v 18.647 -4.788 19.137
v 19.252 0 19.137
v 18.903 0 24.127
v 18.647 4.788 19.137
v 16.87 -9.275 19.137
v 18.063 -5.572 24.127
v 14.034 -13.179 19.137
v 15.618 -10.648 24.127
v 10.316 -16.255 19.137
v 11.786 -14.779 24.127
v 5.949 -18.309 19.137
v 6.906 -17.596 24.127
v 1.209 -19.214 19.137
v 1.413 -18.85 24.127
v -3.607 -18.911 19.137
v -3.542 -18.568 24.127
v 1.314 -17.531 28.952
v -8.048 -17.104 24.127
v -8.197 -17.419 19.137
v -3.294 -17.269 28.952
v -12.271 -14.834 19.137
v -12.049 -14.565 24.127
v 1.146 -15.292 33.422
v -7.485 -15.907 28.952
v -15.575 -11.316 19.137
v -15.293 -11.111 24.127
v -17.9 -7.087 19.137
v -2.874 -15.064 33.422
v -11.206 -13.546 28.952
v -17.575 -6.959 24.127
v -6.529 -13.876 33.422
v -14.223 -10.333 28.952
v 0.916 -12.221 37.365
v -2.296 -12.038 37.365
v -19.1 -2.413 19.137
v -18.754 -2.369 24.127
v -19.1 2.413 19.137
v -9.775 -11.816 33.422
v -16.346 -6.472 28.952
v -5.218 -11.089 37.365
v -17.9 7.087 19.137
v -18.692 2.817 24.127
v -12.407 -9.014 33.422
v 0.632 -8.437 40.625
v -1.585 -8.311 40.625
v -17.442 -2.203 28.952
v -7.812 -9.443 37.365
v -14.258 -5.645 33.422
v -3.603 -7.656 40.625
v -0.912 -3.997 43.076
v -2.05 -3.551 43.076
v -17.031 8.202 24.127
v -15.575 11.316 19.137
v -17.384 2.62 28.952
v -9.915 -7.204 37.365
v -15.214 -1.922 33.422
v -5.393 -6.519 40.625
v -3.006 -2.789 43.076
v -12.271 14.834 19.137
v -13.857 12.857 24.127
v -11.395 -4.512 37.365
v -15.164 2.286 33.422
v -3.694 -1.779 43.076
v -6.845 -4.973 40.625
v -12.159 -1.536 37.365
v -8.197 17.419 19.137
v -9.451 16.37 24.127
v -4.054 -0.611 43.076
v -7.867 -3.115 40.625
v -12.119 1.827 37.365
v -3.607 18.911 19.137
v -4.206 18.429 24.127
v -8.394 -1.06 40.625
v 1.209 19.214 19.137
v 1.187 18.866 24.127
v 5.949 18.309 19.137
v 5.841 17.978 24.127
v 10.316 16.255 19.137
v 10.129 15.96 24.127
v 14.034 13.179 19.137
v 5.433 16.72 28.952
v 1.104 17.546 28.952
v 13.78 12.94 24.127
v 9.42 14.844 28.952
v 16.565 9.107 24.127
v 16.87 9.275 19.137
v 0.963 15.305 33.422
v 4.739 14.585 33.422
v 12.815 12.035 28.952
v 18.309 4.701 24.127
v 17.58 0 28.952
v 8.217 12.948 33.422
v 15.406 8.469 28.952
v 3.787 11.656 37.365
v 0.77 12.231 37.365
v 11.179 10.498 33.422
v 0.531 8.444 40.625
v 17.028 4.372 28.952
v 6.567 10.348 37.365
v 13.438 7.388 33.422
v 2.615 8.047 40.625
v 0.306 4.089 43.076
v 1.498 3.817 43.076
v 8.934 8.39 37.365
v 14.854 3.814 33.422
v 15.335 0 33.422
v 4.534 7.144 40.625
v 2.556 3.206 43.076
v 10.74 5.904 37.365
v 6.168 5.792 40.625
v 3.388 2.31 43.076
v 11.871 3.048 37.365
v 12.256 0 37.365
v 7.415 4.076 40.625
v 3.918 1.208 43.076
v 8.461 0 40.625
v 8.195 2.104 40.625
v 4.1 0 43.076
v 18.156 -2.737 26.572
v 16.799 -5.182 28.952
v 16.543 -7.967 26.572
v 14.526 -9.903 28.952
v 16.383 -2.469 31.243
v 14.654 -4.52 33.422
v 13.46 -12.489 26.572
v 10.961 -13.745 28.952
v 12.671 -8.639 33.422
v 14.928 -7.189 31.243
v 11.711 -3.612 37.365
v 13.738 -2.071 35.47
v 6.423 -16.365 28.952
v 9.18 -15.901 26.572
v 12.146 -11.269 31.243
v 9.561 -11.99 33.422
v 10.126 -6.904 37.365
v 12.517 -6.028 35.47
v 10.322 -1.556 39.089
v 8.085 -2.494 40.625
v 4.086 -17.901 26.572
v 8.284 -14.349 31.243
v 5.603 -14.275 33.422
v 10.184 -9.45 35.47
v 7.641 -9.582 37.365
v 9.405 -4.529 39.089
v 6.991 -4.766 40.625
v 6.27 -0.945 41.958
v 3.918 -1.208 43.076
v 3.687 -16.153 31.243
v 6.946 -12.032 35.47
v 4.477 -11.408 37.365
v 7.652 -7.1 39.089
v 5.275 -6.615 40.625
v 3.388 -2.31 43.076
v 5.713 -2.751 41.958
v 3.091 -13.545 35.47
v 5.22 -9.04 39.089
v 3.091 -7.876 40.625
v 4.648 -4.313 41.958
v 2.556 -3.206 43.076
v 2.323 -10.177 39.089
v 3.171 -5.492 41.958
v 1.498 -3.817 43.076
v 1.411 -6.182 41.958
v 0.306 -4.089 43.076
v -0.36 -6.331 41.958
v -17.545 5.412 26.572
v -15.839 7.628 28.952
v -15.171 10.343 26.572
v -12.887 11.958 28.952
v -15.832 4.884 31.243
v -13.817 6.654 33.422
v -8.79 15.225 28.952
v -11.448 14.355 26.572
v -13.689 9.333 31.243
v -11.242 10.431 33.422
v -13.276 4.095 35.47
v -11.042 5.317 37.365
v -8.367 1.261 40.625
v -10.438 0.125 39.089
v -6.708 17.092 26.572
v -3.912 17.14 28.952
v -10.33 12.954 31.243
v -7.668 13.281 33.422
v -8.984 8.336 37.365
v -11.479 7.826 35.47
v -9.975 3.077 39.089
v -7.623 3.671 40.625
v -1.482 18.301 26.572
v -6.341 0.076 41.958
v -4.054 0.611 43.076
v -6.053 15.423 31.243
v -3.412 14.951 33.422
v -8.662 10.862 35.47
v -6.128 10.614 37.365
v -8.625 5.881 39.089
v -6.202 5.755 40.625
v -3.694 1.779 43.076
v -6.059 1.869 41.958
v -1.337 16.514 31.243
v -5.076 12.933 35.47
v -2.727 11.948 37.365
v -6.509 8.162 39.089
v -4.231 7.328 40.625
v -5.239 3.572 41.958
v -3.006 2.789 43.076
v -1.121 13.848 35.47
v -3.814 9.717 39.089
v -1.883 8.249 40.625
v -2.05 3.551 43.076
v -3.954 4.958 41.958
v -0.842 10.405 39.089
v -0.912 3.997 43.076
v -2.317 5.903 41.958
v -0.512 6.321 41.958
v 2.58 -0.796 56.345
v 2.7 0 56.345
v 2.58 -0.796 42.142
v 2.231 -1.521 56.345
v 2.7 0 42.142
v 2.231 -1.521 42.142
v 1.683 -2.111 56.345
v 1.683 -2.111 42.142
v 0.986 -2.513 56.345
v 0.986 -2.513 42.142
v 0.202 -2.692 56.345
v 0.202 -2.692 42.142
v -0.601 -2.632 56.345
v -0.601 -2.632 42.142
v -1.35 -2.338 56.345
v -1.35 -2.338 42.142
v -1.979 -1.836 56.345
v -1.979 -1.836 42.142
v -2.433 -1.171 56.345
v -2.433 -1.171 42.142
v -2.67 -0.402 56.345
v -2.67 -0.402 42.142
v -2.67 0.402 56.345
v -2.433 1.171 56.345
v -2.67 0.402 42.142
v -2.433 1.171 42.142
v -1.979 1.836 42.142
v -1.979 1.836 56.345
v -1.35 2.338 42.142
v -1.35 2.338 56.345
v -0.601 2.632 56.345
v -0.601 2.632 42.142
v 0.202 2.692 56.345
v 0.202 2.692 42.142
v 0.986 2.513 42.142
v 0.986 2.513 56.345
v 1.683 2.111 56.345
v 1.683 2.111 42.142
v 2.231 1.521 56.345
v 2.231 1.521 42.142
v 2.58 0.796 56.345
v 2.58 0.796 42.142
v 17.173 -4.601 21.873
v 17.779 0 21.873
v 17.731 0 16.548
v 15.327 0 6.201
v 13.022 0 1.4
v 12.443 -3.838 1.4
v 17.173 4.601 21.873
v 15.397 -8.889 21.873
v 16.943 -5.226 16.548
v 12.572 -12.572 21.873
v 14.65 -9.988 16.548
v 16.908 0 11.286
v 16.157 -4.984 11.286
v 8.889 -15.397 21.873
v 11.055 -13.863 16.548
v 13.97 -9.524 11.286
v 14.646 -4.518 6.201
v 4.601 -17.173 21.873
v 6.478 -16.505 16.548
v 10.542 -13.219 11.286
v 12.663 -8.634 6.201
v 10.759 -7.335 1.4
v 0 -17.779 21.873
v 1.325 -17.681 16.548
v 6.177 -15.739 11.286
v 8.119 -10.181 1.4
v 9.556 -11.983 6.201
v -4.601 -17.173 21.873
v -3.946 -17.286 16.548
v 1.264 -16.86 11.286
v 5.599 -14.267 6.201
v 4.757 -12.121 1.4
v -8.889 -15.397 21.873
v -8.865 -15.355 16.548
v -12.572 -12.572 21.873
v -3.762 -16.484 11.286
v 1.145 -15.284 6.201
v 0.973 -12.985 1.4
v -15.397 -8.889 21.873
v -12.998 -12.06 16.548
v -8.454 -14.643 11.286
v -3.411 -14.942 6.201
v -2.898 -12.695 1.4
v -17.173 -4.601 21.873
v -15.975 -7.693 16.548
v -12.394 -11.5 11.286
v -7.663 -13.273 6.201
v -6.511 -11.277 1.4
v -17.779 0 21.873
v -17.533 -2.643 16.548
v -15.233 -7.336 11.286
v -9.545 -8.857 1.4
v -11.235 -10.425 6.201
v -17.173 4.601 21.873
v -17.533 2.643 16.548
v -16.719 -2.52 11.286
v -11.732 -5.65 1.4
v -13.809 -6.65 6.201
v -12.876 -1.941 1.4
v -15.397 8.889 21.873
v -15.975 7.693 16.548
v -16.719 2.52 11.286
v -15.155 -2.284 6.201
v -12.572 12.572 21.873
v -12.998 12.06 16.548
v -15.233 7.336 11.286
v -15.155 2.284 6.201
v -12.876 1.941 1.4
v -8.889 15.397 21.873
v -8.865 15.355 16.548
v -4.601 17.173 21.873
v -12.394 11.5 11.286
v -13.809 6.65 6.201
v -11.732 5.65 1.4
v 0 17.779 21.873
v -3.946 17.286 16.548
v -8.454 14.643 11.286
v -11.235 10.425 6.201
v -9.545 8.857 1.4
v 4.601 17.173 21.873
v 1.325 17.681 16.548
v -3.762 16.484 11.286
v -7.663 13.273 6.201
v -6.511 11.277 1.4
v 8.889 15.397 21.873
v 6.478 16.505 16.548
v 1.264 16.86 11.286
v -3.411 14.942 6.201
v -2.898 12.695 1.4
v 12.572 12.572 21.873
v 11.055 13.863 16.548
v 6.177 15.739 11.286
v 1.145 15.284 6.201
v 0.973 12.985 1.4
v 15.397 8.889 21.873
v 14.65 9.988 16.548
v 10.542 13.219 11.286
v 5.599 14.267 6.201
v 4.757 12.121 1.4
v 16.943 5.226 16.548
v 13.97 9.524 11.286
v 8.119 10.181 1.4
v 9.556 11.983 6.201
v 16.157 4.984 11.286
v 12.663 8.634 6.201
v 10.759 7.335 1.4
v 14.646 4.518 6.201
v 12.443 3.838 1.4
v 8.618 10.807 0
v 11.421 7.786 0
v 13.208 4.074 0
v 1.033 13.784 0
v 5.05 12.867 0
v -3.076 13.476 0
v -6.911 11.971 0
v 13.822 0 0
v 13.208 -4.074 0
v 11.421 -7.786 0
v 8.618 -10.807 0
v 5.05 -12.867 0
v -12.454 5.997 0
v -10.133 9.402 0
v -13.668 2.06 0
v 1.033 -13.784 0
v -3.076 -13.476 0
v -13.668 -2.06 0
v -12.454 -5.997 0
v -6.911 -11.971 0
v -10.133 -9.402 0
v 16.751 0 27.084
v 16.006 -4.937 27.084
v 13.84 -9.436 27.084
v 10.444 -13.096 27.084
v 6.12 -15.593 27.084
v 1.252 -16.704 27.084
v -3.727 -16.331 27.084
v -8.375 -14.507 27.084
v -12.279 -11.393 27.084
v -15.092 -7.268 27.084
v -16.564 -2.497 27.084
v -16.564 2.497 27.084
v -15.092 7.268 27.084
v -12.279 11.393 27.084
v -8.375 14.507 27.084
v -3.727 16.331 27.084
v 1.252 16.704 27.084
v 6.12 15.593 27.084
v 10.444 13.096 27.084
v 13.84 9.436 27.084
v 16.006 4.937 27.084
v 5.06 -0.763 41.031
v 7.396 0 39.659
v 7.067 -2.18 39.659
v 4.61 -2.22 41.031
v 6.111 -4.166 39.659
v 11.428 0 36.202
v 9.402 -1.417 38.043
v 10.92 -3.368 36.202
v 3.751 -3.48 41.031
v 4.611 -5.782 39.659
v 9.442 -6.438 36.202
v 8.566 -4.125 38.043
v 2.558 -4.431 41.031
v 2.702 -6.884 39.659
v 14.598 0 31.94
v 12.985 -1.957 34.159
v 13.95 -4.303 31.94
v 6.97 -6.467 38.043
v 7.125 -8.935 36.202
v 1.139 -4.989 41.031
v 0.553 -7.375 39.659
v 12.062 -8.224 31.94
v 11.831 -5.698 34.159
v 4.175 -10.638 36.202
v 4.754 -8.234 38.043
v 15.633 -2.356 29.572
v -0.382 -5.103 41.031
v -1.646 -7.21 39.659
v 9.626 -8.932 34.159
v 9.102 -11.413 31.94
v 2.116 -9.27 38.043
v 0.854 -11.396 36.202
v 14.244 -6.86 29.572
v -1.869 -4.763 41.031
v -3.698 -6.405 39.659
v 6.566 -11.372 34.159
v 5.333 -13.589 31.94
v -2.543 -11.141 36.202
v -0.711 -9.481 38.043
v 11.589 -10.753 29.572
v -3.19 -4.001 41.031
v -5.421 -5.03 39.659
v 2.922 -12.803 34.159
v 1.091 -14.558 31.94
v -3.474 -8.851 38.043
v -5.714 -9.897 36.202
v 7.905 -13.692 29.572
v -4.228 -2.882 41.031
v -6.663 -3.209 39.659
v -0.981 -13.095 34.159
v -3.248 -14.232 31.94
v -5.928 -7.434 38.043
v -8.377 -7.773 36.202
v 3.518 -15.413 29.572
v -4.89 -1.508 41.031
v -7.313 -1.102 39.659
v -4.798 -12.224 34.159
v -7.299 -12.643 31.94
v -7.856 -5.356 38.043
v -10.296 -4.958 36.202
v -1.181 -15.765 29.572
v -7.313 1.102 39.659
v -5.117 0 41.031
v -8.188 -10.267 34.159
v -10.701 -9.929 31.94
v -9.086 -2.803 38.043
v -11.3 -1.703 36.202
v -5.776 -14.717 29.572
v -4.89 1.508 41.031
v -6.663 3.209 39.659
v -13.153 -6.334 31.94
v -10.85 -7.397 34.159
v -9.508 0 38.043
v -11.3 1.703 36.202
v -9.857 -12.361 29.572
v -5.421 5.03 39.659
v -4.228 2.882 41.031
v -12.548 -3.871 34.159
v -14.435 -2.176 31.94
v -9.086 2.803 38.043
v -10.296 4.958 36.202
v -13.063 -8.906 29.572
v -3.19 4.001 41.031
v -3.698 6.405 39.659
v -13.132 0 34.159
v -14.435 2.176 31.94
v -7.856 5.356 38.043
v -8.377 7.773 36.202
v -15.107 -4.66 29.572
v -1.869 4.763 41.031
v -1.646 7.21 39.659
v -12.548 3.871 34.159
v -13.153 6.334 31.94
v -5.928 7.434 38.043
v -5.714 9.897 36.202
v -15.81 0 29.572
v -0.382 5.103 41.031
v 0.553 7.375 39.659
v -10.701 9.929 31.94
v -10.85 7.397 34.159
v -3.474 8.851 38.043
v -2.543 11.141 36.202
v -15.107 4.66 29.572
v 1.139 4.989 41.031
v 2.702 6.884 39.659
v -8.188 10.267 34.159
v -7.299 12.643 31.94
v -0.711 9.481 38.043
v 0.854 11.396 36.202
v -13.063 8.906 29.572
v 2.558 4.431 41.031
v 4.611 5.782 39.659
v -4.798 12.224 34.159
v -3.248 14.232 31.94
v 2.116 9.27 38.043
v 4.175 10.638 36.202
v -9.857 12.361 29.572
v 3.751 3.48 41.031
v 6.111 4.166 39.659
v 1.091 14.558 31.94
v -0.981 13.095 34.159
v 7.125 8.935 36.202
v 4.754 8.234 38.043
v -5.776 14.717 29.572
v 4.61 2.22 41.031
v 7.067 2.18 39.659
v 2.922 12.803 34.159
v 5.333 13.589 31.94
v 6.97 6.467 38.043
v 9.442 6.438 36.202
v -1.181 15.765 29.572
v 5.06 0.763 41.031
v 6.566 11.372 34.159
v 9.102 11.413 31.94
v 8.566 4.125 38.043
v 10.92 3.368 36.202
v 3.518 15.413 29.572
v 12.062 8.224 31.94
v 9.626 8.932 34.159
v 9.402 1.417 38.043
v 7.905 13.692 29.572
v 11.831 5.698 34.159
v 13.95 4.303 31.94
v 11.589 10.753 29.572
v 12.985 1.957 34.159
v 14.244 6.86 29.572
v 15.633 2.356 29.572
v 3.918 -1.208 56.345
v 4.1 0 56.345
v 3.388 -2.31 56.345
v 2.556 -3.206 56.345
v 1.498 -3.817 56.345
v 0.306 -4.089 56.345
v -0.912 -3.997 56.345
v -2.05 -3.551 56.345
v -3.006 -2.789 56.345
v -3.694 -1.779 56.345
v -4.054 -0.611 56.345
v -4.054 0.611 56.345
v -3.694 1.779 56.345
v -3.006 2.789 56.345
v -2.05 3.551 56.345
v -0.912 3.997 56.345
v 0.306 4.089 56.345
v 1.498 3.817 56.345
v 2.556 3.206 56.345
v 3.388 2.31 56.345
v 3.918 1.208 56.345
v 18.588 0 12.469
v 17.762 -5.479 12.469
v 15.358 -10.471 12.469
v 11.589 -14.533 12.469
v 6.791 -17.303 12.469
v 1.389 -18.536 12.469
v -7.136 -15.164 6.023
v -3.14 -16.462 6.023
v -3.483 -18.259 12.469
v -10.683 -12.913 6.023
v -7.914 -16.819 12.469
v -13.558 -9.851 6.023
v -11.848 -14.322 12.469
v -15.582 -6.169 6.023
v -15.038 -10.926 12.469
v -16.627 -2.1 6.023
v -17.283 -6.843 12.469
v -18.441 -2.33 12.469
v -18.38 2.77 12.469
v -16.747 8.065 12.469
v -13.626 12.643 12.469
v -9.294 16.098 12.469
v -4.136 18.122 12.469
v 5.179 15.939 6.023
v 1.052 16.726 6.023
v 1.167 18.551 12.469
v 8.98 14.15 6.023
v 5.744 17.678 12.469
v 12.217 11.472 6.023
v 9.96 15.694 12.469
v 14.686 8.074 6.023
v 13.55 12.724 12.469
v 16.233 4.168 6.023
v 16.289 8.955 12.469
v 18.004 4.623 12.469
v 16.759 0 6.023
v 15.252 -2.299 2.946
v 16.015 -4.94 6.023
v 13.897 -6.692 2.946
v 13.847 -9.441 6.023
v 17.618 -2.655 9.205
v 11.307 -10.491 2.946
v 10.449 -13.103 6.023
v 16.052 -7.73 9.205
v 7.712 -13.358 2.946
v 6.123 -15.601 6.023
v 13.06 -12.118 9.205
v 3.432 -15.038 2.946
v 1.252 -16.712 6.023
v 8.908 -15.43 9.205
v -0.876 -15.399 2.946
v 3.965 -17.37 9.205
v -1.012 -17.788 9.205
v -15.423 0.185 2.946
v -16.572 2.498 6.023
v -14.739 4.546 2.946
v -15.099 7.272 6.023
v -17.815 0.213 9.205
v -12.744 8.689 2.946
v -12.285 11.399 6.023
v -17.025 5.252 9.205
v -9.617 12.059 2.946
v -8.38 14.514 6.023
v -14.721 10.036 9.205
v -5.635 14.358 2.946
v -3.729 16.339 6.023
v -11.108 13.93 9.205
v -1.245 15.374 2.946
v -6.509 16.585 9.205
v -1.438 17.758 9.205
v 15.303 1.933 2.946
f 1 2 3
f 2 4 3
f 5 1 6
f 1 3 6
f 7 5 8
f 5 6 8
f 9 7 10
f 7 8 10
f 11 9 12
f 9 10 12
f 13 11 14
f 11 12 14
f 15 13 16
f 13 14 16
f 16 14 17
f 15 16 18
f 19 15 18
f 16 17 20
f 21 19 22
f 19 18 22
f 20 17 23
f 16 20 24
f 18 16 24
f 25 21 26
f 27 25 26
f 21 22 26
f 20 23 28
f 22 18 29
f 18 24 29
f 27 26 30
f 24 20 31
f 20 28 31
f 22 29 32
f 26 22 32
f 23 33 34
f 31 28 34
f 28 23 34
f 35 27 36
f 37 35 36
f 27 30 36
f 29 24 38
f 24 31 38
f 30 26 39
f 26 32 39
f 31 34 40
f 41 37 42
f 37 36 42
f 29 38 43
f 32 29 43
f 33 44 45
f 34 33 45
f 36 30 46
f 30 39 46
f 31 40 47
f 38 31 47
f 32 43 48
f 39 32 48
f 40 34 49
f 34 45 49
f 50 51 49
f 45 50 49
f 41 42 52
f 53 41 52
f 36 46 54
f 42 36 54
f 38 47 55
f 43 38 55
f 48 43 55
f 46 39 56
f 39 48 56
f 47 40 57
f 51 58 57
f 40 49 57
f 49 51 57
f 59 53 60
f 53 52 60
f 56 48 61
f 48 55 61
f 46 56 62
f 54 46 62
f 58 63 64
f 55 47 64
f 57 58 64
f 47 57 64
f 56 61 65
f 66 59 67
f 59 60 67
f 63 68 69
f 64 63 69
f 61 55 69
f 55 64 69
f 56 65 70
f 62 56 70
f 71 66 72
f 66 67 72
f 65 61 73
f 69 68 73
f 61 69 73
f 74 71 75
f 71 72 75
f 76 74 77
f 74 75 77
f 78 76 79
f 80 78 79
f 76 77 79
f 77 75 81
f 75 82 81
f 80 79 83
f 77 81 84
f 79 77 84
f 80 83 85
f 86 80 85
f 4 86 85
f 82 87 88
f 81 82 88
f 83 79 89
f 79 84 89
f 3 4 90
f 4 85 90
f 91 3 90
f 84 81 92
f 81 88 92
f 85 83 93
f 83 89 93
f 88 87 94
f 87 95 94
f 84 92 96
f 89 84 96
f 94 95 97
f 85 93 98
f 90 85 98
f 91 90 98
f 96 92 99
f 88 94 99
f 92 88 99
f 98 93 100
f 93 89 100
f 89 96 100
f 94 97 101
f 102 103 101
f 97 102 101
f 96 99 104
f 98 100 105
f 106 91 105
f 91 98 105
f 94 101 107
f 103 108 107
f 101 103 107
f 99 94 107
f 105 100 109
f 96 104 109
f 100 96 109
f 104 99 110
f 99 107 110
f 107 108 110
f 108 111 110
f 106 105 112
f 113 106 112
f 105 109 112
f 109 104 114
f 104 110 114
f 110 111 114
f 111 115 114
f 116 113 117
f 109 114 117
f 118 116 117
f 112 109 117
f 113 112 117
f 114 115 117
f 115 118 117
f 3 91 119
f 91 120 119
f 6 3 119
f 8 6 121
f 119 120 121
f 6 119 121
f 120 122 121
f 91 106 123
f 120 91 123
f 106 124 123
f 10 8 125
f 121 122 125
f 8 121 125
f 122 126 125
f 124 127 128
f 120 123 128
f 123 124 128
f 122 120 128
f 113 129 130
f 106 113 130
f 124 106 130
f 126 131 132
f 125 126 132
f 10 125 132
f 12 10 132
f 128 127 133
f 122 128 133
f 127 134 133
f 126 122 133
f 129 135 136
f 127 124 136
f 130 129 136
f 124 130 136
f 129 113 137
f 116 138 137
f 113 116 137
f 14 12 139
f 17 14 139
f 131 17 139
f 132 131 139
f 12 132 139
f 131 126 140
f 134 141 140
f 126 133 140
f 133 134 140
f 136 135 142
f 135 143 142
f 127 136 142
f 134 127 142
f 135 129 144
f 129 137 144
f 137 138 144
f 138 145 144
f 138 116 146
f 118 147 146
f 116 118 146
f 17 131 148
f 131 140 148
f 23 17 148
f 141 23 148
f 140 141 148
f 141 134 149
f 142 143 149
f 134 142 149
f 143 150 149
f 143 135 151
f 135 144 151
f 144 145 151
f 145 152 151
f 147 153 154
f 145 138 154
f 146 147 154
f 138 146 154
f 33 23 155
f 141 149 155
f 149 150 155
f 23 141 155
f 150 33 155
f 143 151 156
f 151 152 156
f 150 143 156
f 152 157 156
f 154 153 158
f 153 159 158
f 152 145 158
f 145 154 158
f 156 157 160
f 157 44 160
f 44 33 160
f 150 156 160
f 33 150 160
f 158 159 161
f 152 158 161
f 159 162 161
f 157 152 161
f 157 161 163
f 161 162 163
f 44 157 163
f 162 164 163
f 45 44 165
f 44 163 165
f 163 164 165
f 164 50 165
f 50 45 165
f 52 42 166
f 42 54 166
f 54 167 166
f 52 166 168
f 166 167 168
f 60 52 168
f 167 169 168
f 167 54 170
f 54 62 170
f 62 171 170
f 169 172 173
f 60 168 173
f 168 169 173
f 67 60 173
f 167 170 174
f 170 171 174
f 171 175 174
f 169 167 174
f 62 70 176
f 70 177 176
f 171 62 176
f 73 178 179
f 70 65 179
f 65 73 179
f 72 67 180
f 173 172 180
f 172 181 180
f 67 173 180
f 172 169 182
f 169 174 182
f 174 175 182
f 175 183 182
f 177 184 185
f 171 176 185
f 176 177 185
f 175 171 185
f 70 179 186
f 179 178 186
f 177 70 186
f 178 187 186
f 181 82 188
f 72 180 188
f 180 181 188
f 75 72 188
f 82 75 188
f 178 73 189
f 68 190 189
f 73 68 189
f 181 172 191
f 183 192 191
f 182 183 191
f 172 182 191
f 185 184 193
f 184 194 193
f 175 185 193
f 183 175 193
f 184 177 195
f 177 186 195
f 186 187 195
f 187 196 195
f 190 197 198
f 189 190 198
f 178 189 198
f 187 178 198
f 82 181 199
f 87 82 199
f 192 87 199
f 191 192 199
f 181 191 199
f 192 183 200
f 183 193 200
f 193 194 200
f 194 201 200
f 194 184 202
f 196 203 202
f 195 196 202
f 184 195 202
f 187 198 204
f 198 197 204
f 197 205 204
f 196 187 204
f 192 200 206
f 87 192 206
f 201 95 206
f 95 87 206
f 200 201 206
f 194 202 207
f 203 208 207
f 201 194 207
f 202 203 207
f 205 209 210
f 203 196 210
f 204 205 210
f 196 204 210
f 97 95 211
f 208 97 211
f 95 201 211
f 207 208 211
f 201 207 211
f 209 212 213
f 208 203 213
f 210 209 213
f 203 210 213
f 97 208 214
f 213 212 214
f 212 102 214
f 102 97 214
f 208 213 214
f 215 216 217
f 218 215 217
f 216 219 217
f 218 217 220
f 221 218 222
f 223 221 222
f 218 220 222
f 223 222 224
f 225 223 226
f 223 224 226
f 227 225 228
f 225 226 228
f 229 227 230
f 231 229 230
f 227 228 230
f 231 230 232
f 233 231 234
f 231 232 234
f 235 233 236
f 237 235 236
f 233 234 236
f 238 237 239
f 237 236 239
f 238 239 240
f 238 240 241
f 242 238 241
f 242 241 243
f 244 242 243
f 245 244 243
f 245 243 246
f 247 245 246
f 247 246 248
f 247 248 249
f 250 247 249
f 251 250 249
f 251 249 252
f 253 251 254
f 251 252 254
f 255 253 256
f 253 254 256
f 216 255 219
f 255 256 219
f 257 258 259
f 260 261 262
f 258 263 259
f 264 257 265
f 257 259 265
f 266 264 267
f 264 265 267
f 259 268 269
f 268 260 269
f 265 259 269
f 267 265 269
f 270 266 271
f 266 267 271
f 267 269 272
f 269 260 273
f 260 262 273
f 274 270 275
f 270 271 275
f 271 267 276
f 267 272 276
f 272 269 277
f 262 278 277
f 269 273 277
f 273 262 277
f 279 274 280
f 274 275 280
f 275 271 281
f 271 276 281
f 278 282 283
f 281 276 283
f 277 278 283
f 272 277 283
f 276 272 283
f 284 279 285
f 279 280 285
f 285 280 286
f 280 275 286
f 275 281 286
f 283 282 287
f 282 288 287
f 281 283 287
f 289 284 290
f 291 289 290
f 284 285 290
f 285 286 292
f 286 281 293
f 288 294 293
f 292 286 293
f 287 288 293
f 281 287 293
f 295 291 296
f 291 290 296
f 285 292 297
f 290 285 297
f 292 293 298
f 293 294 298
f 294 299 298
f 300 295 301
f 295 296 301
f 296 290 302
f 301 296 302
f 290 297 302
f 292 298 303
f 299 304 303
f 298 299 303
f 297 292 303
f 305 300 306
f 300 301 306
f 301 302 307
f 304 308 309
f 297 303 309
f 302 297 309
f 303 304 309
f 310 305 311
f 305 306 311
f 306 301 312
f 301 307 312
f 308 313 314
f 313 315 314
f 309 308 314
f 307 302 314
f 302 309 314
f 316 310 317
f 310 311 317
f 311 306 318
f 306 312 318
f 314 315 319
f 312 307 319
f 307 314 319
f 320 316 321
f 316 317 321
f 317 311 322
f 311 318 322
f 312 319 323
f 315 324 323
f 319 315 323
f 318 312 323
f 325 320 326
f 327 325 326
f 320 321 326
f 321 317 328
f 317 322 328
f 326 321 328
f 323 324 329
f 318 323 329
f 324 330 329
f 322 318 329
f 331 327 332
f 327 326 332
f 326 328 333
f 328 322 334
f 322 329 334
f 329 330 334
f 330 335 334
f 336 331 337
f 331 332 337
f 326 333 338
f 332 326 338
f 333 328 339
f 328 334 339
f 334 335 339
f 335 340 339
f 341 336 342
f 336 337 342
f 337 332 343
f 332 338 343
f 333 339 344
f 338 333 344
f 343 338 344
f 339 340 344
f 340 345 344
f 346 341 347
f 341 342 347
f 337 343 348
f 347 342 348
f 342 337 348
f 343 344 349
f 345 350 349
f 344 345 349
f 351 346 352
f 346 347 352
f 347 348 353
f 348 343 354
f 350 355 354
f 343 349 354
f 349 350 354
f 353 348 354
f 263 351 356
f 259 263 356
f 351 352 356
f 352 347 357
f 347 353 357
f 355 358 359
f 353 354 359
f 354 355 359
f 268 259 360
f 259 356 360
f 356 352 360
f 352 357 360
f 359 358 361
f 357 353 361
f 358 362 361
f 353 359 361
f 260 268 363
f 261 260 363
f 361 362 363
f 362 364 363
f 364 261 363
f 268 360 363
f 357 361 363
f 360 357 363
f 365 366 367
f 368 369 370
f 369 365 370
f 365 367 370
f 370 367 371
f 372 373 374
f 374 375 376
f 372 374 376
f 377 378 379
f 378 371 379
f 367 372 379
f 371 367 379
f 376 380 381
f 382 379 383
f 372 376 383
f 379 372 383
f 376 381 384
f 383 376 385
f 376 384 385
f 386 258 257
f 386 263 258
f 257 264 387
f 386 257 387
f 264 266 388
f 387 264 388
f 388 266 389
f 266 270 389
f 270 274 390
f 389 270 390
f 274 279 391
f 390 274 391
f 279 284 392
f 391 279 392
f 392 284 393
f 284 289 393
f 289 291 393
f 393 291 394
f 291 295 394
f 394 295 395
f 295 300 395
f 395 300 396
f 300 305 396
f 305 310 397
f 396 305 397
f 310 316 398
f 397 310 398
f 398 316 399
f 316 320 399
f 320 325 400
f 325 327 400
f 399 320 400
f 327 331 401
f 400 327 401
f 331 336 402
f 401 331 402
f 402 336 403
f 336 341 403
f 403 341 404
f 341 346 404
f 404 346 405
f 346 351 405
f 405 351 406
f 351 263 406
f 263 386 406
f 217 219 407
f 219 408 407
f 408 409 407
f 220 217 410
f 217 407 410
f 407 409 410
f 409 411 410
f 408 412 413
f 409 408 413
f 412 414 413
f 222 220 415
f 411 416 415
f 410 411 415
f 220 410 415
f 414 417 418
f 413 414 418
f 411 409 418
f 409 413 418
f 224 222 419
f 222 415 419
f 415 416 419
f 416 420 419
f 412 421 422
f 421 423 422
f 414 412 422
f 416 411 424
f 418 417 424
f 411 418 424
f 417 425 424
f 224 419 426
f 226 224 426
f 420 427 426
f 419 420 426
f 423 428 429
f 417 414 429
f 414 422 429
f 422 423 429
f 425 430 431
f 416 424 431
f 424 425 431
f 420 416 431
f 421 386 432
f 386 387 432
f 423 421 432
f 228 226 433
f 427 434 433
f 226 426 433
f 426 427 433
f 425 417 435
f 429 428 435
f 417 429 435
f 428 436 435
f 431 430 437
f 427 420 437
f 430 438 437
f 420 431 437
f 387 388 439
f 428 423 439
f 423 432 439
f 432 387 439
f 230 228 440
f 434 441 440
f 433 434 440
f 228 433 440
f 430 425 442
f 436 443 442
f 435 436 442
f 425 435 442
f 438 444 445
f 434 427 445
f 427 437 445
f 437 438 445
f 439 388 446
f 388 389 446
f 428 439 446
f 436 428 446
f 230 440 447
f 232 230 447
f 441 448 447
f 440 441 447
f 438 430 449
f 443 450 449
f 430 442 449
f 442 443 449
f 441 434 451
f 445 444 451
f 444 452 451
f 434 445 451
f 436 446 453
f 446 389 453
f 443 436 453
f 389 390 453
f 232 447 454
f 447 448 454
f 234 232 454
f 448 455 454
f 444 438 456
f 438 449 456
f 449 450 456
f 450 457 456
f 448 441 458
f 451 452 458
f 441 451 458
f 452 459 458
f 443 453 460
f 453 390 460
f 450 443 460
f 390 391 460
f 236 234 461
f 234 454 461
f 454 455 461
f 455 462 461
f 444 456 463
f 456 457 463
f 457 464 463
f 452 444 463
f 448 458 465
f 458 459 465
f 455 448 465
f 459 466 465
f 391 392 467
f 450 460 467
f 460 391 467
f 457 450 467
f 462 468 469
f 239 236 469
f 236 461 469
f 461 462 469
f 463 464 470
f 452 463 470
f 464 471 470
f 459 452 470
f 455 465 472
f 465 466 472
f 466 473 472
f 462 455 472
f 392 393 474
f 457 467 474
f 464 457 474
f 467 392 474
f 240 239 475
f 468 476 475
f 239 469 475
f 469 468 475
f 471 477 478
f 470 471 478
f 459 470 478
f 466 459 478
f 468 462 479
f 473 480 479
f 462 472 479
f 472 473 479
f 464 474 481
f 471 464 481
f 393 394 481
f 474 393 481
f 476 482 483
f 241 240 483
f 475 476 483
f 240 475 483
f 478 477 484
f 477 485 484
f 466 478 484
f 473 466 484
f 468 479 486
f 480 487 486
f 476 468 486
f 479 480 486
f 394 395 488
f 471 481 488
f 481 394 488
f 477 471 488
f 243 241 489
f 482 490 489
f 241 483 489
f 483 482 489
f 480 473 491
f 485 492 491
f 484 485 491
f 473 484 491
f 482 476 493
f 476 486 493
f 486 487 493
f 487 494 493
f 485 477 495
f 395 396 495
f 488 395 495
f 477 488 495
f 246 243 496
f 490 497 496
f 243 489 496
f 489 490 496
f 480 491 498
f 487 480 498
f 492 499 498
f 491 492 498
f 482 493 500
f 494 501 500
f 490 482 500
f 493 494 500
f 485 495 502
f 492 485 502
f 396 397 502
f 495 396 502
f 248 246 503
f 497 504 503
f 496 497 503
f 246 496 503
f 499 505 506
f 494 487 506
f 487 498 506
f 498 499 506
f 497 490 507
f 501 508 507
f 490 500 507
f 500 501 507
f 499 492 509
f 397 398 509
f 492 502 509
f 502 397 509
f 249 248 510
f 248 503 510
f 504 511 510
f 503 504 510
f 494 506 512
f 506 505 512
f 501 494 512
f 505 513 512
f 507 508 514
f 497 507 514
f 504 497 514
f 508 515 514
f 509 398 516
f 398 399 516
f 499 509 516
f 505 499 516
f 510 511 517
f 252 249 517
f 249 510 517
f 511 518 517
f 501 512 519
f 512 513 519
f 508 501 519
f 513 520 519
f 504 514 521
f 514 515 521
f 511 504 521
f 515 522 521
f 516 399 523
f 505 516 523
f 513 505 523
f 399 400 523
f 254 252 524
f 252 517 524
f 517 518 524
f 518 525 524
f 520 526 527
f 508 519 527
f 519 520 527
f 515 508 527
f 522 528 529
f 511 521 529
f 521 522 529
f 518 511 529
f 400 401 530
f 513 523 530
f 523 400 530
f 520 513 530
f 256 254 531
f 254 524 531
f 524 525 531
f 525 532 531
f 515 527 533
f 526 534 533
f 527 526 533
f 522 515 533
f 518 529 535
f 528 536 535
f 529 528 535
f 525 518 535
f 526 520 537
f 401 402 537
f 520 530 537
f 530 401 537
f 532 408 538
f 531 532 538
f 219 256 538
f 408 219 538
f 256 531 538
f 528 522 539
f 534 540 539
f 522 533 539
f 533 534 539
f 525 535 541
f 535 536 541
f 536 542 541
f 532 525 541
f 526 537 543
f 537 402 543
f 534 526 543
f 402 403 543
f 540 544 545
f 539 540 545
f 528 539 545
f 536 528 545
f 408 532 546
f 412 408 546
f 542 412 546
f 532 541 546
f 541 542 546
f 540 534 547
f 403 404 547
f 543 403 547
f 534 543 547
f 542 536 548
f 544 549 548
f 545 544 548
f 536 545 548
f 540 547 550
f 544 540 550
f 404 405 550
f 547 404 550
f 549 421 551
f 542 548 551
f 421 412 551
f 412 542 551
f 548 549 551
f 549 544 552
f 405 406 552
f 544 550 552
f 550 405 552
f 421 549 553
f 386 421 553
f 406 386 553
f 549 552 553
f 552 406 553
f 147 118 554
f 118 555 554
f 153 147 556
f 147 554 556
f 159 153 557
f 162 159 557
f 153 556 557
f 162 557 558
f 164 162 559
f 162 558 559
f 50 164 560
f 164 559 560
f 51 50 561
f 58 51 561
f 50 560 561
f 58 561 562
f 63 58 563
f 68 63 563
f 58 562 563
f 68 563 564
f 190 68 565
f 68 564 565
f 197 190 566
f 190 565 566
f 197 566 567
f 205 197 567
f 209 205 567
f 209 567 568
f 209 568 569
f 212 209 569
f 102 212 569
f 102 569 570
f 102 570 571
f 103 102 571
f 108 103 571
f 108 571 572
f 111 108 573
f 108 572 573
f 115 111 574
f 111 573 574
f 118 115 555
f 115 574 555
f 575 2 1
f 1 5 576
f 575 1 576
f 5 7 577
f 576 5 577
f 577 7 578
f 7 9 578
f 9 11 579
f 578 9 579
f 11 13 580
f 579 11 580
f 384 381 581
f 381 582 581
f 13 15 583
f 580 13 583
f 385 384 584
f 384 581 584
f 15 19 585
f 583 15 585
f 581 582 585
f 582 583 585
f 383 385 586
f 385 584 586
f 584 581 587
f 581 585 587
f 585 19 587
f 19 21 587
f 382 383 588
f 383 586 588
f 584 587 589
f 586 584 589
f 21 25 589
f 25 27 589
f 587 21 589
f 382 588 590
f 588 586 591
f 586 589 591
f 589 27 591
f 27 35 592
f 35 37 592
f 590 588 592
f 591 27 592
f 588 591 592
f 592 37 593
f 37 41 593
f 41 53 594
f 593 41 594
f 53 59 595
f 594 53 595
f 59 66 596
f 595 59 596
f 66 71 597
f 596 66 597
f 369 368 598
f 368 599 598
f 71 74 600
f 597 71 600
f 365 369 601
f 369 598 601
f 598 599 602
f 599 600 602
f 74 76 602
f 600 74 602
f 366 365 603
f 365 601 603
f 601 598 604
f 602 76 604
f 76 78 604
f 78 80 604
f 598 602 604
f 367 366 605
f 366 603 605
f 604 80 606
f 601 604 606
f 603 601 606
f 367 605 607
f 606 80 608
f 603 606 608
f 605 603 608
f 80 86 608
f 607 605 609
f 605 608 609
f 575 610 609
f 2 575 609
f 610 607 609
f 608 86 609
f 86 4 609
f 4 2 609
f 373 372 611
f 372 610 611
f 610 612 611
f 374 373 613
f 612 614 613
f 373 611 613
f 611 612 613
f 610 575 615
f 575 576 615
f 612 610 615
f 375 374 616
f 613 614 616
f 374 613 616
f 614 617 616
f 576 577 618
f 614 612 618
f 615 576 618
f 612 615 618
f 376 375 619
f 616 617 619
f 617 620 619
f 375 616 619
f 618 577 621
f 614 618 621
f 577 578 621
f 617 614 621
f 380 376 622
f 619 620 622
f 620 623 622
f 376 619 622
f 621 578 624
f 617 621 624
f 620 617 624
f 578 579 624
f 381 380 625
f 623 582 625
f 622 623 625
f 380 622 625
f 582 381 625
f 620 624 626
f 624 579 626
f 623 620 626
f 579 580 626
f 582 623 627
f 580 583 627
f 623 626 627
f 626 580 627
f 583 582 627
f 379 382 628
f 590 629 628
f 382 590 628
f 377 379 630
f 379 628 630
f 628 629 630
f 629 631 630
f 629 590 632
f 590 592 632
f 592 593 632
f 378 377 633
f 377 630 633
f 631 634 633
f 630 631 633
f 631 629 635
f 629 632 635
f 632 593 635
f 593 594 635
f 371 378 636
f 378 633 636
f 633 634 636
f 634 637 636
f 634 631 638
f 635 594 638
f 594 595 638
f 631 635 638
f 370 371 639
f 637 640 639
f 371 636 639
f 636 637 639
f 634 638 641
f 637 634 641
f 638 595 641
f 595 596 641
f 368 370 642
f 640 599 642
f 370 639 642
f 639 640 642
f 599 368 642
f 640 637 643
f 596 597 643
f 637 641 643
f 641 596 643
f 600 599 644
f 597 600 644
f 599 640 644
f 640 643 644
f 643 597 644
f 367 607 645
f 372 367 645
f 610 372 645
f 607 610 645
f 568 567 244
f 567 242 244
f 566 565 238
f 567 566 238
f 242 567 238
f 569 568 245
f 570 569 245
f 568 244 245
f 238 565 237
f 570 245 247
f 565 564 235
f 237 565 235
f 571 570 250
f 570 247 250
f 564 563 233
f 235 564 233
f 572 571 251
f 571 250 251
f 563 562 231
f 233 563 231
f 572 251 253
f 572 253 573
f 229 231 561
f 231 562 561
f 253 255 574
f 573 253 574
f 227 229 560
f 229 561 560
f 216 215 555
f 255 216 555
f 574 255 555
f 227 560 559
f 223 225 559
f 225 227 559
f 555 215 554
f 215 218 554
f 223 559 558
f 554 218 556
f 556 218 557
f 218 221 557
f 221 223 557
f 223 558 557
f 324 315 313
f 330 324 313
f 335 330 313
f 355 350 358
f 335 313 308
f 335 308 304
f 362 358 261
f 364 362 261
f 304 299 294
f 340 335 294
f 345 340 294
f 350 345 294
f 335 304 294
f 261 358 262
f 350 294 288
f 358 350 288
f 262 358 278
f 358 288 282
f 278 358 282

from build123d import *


with BuildPart() as f1:
    # F0 (on Front) → F1 (revolve)
    with BuildSketch(Plane.XZ):
        with BuildLine():
            Line((4.1, 43.075935), (4.1, 56.344669))
            Line((4.1, 56.344669), (2.7, 56.344669))
            Line((2.7, 56.344669), (2.7, 42.14222))
            ThreePointArc((2.7, 42.14222), (13.1318, 34.159302), (17.778806, 21.872937))
            ThreePointArc((17.778806, 21.872937), (16.907718, 11.28617), (13.021579, 1.4))
            Line((13.021579, 1.4), (0, 1.4))
            Line((0, 1.4), (0, 0))
            Line((0, 0), (13.822387, 0))
            ThreePointArc((13.822387, 0), (17.816502, 9.205343), (19.251609, 19.136696))
            ThreePointArc((19.251609, 19.136696), (15.33531, 33.422487), (4.1, 43.075935))
        make_face()
    revolve(axis=Axis((0, 0, 0.7), (0, 0, -1)))


solid = f1.part
